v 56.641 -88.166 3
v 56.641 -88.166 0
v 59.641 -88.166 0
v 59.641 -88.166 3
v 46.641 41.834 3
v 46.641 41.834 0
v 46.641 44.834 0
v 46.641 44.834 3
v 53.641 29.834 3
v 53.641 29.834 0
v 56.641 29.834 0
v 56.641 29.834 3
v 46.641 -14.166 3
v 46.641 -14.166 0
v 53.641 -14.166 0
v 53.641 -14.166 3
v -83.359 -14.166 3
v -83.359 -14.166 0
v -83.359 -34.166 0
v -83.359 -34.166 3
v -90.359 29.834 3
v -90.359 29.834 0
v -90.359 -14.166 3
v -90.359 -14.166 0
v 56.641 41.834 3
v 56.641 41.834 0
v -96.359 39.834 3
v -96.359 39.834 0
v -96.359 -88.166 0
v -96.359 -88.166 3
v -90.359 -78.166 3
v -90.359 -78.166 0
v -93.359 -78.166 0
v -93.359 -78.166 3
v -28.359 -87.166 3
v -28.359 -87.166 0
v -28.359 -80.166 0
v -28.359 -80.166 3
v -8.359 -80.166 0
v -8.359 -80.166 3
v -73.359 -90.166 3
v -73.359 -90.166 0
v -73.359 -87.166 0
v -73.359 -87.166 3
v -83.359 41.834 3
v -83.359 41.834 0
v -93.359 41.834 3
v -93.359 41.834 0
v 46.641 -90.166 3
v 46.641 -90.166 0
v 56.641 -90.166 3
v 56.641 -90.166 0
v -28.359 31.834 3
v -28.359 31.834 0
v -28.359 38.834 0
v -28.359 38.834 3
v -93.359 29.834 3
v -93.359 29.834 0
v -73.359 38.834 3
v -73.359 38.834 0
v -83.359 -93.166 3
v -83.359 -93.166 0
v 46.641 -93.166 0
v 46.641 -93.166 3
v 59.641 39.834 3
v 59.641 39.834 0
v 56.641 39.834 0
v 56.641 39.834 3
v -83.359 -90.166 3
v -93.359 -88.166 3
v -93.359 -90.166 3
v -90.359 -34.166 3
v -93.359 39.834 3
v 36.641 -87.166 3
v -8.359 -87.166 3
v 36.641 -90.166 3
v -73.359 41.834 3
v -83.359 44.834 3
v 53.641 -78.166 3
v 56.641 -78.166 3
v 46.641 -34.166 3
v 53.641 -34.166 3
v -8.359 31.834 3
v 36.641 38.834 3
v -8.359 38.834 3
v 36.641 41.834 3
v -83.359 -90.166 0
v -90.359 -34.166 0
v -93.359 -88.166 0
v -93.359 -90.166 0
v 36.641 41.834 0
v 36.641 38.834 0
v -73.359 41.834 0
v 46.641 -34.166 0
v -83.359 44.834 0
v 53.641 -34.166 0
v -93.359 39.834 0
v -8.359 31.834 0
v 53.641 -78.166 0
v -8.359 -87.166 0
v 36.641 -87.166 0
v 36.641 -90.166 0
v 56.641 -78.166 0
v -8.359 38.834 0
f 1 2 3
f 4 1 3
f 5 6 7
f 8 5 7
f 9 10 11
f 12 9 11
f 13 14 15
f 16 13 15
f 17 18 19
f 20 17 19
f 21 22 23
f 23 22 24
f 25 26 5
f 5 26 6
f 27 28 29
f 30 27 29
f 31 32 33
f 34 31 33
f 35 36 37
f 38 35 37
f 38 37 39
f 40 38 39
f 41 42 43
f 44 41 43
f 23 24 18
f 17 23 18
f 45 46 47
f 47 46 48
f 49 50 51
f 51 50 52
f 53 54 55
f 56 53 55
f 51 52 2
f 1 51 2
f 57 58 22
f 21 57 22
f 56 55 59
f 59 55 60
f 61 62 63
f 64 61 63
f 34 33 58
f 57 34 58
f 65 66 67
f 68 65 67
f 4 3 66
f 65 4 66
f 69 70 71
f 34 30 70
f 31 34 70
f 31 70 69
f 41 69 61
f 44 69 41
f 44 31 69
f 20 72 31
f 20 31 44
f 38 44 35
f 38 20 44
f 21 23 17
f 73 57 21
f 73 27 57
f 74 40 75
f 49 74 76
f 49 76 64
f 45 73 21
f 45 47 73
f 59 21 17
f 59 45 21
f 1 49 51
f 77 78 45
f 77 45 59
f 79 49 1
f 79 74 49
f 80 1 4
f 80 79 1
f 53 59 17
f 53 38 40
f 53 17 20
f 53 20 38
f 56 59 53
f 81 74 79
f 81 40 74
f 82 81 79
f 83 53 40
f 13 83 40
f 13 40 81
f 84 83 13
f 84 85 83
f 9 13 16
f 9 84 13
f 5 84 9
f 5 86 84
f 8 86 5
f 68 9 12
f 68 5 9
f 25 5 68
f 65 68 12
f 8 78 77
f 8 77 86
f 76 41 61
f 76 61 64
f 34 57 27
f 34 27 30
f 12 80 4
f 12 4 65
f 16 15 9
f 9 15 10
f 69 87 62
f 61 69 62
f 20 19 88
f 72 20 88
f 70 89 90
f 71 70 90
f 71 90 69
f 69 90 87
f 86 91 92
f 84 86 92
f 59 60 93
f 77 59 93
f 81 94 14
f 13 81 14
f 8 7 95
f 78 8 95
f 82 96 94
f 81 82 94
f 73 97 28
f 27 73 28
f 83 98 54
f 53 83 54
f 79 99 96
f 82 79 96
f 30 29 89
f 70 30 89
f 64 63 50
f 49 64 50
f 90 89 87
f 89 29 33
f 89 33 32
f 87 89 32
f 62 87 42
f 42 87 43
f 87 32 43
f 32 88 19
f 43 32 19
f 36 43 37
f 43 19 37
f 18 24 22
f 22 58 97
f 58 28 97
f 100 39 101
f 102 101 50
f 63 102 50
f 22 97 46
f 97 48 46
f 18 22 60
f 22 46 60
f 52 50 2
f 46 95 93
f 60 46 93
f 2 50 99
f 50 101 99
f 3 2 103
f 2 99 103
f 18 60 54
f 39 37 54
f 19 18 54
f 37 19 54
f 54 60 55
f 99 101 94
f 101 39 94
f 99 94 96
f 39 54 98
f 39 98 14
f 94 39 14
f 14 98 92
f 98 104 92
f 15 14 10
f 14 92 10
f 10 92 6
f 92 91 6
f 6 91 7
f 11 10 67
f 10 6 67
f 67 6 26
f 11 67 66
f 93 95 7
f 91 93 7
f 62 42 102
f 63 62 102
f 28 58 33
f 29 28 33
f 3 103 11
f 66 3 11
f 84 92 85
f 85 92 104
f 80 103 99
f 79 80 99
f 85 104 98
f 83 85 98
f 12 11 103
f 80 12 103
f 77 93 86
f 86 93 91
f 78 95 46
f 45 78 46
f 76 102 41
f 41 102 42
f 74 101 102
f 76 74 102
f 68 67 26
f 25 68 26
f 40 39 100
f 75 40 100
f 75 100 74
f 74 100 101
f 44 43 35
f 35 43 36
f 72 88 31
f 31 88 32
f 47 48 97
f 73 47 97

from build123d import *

# Parameters (mm, degrees)
BOSS_EXTRUDE1_DEPTH = 3


with BuildPart() as part:
    # Sketch1 → Boss-Extrude1 (new body)
    with BuildSketch(Plane.XY):
        Polygon((46.640816327, 44.833717619), (-83.359183673, 44.833717619), (-83.359183673, 41.833717619), (-93.359183673, 41.833717619), (-93.359183673, 39.833717619), (-96.359183673, 39.833717619), (-96.359183673, -88.166282381), (-93.359183673, -88.166282381), (-93.359183673, -90.166282381), (-83.359183673, -90.166282381), (-83.359183673, -93.166282381), (46.640816327, -93.166282381), (46.640816327, -90.166282381), (56.640816327, -90.166282381), (56.640816327, -88.166282381), (59.640816327, -88.166282381), (59.640816327, 39.833717619), (56.640816327, 39.833717619), (56.640816327, 41.833717619), (46.640816327, 41.833717619), align=None)
        Polygon((-8.359183673, -80.166282381), (-8.359183673, -87.166282381), (36.640816327, -87.166282381), (36.640816327, -90.166282381), (-73.359183673, -90.166282381), (-73.359183673, -87.166282381), (-28.359183673, -87.166282381), (-28.359183673, -80.166282381), align=None, mode=Mode.SUBTRACT)
        Polygon((-93.359183673, -78.166282381), (-93.359183673, 29.833717619), (-90.359183673, 29.833717619), (-90.359183673, -14.166282381), (-83.359183673, -14.166282381), (-83.359183673, -34.166282381), (-90.359183673, -34.166282381), (-90.359183673, -78.166282381), align=None, mode=Mode.SUBTRACT)
        Polygon((-73.359183673, 38.833717619), (-73.359183673, 41.833717619), (36.640816327, 41.833717619), (36.640816327, 38.833717619), (-8.359183673, 38.833717619), (-8.359183673, 31.833717619), (-28.359183673, 31.833717619), (-28.359183673, 38.833717619), align=None, mode=Mode.SUBTRACT)
        Polygon((46.640816327, -34.166282381), (46.640816327, -14.166282381), (53.640816327, -14.166282381), (53.640816327, 29.833717619), (56.640816327, 29.833717619), (56.640816327, -78.166282381), (53.640816327, -78.166282381), (53.640816327, -34.166282381), align=None, mode=Mode.SUBTRACT)
    extrude(amount=BOSS_EXTRUDE1_DEPTH)


solid = part.part
